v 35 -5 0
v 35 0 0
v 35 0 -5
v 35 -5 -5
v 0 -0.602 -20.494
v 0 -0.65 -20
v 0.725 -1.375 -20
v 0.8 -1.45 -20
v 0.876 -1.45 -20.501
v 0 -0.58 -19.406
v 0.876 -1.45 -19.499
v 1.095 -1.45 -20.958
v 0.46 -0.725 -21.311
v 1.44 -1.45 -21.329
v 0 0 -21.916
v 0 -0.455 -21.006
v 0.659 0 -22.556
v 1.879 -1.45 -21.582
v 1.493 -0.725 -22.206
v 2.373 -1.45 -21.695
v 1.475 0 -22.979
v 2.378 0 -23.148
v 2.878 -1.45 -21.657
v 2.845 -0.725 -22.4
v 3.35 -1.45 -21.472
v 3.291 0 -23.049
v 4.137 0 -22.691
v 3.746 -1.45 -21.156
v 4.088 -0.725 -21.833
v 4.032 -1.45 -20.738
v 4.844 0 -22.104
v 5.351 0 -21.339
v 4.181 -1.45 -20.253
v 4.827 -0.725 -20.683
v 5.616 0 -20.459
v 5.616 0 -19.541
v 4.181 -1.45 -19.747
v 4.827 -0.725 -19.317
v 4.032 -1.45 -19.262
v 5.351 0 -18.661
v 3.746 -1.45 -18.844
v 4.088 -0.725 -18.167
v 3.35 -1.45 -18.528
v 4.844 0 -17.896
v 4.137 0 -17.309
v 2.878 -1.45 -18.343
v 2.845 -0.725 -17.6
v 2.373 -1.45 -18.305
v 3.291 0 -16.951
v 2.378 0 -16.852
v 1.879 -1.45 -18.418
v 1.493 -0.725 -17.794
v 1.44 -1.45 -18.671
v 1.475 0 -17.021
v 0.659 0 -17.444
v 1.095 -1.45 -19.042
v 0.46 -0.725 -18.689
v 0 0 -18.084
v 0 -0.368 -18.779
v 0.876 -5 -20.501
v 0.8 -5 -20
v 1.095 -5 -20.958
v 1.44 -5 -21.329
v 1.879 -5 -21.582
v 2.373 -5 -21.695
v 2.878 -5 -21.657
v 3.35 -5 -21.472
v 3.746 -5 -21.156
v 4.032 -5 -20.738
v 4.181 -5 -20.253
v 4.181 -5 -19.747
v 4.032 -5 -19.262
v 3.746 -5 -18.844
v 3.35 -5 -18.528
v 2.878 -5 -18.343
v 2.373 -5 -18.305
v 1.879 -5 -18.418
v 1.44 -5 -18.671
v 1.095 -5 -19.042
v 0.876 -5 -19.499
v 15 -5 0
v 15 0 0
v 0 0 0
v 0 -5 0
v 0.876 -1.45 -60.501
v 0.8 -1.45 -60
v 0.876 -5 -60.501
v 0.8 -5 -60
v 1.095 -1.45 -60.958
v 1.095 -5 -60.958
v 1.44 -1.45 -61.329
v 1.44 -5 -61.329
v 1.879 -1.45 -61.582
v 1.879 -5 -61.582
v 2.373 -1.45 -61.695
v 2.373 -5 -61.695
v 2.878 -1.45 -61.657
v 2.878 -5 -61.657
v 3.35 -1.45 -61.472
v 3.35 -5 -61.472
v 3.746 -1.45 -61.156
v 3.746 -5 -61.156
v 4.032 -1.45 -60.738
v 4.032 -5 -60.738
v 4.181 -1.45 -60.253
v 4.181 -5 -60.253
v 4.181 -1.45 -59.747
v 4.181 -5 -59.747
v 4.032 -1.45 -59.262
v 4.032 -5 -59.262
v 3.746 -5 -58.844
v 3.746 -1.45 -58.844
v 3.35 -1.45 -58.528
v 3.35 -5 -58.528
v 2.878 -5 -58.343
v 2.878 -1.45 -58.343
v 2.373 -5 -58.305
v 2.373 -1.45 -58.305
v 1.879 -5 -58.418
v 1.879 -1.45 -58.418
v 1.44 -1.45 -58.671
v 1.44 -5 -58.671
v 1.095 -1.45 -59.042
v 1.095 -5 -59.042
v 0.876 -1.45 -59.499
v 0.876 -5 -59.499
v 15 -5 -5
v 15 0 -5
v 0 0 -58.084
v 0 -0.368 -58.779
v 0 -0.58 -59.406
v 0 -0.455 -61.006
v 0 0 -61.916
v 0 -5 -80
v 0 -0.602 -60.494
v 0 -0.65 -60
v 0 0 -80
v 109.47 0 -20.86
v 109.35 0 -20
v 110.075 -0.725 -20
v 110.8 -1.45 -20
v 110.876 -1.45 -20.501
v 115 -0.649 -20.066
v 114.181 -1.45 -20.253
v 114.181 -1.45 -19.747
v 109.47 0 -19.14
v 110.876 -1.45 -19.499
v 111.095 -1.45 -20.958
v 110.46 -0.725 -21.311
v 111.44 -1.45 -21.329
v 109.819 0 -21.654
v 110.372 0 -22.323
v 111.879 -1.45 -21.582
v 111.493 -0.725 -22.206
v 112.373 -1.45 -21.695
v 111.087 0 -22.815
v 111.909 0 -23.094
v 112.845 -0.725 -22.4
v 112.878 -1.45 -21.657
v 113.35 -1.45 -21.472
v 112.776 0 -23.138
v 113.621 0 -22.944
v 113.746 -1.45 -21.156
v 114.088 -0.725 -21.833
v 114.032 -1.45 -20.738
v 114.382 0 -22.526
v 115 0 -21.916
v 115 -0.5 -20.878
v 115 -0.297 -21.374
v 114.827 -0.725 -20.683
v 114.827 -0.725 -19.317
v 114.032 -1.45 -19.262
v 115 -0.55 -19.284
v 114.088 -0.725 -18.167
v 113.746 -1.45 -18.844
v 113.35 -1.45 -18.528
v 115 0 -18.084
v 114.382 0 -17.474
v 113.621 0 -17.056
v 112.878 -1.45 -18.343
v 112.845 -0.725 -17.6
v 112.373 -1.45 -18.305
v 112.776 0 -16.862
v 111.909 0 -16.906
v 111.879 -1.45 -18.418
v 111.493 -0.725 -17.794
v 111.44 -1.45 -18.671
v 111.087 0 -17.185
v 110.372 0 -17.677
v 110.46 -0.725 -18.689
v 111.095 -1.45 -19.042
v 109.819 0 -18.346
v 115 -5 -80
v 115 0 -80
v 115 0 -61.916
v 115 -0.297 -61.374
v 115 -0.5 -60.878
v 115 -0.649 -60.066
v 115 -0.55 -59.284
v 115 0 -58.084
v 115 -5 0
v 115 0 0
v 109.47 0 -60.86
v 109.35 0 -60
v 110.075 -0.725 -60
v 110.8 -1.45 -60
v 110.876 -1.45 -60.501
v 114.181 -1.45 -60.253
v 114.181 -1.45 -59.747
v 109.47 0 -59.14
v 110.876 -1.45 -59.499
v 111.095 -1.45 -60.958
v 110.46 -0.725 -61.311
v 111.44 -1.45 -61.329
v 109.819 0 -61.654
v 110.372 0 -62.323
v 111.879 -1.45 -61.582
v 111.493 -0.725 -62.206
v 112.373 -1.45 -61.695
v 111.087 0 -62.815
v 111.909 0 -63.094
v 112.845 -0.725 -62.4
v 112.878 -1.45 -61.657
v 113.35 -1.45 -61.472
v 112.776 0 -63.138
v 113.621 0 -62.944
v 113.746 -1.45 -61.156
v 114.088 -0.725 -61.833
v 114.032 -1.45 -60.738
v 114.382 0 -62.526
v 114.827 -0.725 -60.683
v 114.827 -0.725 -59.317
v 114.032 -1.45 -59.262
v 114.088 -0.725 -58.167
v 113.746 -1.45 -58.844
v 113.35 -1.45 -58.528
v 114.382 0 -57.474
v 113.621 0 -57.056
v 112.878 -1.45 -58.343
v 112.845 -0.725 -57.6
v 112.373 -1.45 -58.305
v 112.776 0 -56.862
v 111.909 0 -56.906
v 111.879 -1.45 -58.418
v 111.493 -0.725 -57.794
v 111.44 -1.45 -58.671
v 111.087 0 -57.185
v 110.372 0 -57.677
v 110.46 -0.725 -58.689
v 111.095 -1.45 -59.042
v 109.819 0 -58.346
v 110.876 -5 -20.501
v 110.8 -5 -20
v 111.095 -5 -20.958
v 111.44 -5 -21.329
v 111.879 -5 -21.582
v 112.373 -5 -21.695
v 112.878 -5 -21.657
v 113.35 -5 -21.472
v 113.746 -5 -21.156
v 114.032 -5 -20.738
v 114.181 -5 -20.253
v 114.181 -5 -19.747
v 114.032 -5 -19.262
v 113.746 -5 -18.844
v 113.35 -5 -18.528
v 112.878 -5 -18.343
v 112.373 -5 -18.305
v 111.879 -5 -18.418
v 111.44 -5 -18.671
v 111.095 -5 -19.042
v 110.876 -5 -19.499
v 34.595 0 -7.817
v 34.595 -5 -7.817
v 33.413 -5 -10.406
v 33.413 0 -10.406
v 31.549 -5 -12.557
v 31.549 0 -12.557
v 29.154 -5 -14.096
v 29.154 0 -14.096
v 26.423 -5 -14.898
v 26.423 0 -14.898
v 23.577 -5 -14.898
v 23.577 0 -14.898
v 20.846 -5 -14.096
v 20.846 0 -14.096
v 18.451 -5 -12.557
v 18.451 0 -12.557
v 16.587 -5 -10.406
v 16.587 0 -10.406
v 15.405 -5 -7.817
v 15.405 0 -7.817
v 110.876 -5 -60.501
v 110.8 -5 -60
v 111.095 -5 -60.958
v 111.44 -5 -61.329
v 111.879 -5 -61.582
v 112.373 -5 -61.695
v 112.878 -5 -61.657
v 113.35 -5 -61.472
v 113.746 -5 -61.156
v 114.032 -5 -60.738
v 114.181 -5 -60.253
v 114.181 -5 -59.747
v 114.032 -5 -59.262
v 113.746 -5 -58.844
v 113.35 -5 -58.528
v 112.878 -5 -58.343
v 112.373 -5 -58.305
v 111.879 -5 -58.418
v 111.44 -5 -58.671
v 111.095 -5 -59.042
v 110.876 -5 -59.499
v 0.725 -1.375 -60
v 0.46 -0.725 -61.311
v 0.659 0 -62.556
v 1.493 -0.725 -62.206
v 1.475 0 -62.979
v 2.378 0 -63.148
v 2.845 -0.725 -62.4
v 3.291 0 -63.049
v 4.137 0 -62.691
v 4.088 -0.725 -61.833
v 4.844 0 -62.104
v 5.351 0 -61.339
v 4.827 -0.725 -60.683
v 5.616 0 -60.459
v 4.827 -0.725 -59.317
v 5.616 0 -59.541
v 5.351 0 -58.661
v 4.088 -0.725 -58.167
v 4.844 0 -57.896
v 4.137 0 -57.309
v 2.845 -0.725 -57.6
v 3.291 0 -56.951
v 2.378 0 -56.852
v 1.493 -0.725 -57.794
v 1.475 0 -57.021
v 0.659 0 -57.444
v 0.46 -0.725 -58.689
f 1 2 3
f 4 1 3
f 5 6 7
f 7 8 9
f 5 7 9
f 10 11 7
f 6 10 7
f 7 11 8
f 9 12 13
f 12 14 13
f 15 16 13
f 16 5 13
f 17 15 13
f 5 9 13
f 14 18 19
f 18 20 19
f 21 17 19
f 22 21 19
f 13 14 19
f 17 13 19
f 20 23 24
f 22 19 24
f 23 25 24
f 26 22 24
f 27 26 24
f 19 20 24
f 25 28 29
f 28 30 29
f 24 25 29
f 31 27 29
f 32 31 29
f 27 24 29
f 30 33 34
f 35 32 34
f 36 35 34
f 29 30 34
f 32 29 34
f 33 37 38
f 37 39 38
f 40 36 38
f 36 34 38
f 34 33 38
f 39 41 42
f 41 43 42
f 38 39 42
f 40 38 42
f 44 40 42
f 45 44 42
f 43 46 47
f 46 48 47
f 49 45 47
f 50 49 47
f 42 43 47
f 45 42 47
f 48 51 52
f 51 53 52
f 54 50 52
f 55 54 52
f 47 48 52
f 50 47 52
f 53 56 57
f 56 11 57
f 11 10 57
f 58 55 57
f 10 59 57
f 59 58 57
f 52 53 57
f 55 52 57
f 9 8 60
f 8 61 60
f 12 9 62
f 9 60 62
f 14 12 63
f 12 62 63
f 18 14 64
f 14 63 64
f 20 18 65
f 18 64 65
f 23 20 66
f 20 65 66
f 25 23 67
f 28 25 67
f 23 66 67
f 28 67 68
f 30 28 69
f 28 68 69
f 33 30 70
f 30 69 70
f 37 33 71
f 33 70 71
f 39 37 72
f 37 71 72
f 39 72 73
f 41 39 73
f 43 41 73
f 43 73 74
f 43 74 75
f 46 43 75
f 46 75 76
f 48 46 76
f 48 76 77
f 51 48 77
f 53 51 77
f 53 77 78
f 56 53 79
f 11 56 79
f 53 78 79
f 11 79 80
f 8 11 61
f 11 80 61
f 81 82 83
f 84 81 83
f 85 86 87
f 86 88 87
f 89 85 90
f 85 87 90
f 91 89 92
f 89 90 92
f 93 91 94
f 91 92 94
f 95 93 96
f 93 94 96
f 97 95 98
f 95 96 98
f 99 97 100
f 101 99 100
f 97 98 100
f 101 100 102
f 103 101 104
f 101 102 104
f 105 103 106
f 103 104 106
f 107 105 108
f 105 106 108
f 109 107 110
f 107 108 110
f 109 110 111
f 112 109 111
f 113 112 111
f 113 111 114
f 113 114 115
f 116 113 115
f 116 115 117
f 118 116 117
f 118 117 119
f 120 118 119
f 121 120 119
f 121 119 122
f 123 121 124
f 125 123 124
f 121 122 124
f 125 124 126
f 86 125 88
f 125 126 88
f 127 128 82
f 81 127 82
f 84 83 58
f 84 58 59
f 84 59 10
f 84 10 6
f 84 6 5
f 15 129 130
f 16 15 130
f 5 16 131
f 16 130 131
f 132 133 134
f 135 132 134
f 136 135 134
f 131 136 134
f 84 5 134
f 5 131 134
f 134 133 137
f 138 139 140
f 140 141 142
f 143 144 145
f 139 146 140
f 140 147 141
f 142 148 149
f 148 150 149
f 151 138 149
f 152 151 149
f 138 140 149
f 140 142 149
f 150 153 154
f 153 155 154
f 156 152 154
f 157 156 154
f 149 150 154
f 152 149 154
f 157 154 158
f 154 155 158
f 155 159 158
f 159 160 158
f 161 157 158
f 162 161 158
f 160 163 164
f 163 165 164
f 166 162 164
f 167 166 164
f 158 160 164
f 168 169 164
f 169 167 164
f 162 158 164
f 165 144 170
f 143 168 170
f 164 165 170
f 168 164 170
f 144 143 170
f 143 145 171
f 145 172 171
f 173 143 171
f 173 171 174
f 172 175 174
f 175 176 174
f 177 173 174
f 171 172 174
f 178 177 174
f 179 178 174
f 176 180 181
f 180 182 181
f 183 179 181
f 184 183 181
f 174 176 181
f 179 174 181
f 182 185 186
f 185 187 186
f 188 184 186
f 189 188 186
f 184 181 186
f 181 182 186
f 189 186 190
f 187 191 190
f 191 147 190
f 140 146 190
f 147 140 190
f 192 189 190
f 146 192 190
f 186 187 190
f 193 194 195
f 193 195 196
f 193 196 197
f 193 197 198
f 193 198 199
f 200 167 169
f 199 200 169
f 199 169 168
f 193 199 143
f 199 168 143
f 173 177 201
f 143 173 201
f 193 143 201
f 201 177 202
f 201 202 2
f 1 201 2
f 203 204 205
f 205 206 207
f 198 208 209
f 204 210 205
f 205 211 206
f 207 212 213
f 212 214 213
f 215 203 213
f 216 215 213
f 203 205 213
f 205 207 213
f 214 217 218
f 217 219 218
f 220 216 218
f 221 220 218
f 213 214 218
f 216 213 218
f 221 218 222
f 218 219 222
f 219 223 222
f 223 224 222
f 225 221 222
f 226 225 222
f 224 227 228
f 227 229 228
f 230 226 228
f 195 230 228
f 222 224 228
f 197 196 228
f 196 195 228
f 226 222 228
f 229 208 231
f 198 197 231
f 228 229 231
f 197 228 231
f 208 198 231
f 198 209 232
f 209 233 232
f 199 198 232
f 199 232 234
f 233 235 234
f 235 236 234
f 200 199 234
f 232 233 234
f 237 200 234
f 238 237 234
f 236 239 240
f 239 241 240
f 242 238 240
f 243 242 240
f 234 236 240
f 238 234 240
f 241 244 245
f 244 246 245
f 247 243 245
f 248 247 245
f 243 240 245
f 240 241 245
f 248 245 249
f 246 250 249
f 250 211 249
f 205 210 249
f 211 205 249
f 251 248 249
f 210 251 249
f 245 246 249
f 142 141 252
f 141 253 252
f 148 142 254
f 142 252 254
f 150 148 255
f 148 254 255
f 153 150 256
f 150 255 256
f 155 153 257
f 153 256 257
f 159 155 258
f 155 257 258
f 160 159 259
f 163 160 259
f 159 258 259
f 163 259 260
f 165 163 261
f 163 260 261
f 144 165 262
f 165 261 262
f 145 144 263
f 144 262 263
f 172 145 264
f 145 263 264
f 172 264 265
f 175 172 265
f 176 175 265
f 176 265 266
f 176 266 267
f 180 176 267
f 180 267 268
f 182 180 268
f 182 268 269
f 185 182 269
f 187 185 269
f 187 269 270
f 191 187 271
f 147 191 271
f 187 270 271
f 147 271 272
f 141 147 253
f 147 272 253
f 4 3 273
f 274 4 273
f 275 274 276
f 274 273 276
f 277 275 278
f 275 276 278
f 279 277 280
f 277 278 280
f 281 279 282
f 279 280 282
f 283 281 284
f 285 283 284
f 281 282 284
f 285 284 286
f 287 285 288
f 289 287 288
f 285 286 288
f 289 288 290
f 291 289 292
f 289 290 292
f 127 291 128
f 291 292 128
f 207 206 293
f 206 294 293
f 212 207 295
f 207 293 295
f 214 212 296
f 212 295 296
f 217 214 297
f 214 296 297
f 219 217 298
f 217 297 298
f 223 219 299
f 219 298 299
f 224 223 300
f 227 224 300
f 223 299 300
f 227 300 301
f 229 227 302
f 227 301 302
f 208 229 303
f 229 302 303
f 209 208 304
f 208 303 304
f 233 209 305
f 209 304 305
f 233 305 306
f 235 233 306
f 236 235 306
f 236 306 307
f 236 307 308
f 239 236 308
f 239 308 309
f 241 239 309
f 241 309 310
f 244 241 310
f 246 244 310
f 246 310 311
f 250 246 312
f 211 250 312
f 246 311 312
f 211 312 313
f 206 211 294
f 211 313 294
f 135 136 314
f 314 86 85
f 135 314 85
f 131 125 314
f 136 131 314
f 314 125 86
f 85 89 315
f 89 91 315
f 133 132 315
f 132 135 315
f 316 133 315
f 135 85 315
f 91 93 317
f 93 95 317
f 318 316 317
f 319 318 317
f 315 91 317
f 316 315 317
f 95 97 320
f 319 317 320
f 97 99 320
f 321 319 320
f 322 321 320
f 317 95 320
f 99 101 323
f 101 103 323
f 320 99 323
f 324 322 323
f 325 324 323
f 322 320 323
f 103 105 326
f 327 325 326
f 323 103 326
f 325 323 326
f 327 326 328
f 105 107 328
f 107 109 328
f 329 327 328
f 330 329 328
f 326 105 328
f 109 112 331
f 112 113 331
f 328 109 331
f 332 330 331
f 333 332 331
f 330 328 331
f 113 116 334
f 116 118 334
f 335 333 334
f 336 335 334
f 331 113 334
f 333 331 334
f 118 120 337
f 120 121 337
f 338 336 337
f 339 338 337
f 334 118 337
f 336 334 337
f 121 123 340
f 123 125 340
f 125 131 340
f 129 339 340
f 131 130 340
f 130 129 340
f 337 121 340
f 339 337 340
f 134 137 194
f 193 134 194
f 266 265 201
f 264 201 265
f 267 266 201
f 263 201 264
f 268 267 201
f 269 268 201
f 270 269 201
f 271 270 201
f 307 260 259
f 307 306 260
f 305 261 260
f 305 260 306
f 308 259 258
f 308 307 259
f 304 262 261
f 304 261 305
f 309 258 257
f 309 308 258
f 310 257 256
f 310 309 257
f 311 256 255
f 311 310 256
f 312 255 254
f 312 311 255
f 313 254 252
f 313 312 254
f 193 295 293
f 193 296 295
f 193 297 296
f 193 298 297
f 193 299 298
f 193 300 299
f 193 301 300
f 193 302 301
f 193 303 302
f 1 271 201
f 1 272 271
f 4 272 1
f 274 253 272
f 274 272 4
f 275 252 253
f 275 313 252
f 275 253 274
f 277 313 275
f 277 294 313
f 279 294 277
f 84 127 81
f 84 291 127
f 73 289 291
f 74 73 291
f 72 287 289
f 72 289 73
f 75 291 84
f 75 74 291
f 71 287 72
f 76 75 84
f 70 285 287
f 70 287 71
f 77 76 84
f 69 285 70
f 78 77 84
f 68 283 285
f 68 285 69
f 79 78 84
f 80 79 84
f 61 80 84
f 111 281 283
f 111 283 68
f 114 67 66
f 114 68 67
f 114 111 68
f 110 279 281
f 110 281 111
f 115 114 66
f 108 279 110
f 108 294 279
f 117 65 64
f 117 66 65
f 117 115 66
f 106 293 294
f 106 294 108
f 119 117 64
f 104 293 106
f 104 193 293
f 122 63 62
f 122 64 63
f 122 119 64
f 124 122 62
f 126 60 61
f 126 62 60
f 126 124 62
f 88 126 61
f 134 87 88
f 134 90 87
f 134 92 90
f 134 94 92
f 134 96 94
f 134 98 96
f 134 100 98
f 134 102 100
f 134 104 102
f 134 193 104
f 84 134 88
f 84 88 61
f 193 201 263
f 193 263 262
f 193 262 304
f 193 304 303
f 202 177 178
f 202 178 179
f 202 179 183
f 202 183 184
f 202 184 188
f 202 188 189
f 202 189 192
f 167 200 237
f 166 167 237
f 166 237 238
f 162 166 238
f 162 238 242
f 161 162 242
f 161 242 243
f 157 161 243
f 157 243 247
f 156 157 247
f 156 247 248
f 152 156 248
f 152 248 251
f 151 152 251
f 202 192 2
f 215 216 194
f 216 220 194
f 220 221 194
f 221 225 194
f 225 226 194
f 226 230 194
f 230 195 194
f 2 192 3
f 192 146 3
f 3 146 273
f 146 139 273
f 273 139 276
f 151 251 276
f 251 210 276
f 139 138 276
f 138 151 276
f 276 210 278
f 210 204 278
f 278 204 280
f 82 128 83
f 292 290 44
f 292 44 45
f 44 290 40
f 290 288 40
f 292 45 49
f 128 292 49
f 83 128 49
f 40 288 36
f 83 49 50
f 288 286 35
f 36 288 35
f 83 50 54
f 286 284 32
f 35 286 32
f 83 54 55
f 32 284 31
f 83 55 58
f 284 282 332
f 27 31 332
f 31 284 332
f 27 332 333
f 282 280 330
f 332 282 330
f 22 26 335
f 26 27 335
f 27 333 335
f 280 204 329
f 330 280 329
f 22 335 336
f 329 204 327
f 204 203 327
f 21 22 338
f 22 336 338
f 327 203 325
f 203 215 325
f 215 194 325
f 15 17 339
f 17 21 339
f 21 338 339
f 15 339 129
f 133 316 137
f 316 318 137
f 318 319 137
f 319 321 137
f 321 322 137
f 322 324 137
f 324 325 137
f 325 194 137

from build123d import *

# Parameters (mm, degrees)
BOSS_EXTRUDE1_DEPTH                                 = 5
CSK_FOR_M3_FLAT_COUNTERSUNK_HEAD_SCREW1_D           = 3.4
CSK_FOR_M3_FLAT_COUNTERSUNK_HEAD_SCREW1_CSINK_D     = 6.3
CSK_FOR_M3_FLAT_COUNTERSUNK_HEAD_SCREW1_CSINK_ANGLE = 90


with BuildPart() as part:
    # Sketch1 → Boss-Extrude1 (new body)
    with BuildSketch(Plane(origin=(0, 0, 0), x_dir=(1, 0, 0), z_dir=(0, 1, 0))):
        with BuildLine():
            Line((15, 5), (15, 0))
            Line((15, 0), (0, 0))
            Line((0, 0), (0, 80))
            Line((0, 80), (115, 80))
            Line((115, 80), (115, 0))
            Line((115, 0), (35, 0))
            Line((35, 0), (35, 5))
            ThreePointArc((35, 5), (25, 15), (15, 5))
        make_face()
    extrude(amount=-BOSS_EXTRUDE1_DEPTH)

    # CSK for M3 Flat Countersunk Head Screw1 (through all)
    with Locations(Plane(origin=(0, 0, 0), x_dir=(1, 0, 0), z_dir=(0, 1, 0))):
        with Locations((2.5, 60), (2.5, 20), (112.5, 60), (112.5, 20)):
            CounterSinkHole(CSK_FOR_M3_FLAT_COUNTERSUNK_HEAD_SCREW1_D / 2, CSK_FOR_M3_FLAT_COUNTERSUNK_HEAD_SCREW1_CSINK_D / 2, counter_sink_angle=CSK_FOR_M3_FLAT_COUNTERSUNK_HEAD_SCREW1_CSINK_ANGLE)


solid = part.part
